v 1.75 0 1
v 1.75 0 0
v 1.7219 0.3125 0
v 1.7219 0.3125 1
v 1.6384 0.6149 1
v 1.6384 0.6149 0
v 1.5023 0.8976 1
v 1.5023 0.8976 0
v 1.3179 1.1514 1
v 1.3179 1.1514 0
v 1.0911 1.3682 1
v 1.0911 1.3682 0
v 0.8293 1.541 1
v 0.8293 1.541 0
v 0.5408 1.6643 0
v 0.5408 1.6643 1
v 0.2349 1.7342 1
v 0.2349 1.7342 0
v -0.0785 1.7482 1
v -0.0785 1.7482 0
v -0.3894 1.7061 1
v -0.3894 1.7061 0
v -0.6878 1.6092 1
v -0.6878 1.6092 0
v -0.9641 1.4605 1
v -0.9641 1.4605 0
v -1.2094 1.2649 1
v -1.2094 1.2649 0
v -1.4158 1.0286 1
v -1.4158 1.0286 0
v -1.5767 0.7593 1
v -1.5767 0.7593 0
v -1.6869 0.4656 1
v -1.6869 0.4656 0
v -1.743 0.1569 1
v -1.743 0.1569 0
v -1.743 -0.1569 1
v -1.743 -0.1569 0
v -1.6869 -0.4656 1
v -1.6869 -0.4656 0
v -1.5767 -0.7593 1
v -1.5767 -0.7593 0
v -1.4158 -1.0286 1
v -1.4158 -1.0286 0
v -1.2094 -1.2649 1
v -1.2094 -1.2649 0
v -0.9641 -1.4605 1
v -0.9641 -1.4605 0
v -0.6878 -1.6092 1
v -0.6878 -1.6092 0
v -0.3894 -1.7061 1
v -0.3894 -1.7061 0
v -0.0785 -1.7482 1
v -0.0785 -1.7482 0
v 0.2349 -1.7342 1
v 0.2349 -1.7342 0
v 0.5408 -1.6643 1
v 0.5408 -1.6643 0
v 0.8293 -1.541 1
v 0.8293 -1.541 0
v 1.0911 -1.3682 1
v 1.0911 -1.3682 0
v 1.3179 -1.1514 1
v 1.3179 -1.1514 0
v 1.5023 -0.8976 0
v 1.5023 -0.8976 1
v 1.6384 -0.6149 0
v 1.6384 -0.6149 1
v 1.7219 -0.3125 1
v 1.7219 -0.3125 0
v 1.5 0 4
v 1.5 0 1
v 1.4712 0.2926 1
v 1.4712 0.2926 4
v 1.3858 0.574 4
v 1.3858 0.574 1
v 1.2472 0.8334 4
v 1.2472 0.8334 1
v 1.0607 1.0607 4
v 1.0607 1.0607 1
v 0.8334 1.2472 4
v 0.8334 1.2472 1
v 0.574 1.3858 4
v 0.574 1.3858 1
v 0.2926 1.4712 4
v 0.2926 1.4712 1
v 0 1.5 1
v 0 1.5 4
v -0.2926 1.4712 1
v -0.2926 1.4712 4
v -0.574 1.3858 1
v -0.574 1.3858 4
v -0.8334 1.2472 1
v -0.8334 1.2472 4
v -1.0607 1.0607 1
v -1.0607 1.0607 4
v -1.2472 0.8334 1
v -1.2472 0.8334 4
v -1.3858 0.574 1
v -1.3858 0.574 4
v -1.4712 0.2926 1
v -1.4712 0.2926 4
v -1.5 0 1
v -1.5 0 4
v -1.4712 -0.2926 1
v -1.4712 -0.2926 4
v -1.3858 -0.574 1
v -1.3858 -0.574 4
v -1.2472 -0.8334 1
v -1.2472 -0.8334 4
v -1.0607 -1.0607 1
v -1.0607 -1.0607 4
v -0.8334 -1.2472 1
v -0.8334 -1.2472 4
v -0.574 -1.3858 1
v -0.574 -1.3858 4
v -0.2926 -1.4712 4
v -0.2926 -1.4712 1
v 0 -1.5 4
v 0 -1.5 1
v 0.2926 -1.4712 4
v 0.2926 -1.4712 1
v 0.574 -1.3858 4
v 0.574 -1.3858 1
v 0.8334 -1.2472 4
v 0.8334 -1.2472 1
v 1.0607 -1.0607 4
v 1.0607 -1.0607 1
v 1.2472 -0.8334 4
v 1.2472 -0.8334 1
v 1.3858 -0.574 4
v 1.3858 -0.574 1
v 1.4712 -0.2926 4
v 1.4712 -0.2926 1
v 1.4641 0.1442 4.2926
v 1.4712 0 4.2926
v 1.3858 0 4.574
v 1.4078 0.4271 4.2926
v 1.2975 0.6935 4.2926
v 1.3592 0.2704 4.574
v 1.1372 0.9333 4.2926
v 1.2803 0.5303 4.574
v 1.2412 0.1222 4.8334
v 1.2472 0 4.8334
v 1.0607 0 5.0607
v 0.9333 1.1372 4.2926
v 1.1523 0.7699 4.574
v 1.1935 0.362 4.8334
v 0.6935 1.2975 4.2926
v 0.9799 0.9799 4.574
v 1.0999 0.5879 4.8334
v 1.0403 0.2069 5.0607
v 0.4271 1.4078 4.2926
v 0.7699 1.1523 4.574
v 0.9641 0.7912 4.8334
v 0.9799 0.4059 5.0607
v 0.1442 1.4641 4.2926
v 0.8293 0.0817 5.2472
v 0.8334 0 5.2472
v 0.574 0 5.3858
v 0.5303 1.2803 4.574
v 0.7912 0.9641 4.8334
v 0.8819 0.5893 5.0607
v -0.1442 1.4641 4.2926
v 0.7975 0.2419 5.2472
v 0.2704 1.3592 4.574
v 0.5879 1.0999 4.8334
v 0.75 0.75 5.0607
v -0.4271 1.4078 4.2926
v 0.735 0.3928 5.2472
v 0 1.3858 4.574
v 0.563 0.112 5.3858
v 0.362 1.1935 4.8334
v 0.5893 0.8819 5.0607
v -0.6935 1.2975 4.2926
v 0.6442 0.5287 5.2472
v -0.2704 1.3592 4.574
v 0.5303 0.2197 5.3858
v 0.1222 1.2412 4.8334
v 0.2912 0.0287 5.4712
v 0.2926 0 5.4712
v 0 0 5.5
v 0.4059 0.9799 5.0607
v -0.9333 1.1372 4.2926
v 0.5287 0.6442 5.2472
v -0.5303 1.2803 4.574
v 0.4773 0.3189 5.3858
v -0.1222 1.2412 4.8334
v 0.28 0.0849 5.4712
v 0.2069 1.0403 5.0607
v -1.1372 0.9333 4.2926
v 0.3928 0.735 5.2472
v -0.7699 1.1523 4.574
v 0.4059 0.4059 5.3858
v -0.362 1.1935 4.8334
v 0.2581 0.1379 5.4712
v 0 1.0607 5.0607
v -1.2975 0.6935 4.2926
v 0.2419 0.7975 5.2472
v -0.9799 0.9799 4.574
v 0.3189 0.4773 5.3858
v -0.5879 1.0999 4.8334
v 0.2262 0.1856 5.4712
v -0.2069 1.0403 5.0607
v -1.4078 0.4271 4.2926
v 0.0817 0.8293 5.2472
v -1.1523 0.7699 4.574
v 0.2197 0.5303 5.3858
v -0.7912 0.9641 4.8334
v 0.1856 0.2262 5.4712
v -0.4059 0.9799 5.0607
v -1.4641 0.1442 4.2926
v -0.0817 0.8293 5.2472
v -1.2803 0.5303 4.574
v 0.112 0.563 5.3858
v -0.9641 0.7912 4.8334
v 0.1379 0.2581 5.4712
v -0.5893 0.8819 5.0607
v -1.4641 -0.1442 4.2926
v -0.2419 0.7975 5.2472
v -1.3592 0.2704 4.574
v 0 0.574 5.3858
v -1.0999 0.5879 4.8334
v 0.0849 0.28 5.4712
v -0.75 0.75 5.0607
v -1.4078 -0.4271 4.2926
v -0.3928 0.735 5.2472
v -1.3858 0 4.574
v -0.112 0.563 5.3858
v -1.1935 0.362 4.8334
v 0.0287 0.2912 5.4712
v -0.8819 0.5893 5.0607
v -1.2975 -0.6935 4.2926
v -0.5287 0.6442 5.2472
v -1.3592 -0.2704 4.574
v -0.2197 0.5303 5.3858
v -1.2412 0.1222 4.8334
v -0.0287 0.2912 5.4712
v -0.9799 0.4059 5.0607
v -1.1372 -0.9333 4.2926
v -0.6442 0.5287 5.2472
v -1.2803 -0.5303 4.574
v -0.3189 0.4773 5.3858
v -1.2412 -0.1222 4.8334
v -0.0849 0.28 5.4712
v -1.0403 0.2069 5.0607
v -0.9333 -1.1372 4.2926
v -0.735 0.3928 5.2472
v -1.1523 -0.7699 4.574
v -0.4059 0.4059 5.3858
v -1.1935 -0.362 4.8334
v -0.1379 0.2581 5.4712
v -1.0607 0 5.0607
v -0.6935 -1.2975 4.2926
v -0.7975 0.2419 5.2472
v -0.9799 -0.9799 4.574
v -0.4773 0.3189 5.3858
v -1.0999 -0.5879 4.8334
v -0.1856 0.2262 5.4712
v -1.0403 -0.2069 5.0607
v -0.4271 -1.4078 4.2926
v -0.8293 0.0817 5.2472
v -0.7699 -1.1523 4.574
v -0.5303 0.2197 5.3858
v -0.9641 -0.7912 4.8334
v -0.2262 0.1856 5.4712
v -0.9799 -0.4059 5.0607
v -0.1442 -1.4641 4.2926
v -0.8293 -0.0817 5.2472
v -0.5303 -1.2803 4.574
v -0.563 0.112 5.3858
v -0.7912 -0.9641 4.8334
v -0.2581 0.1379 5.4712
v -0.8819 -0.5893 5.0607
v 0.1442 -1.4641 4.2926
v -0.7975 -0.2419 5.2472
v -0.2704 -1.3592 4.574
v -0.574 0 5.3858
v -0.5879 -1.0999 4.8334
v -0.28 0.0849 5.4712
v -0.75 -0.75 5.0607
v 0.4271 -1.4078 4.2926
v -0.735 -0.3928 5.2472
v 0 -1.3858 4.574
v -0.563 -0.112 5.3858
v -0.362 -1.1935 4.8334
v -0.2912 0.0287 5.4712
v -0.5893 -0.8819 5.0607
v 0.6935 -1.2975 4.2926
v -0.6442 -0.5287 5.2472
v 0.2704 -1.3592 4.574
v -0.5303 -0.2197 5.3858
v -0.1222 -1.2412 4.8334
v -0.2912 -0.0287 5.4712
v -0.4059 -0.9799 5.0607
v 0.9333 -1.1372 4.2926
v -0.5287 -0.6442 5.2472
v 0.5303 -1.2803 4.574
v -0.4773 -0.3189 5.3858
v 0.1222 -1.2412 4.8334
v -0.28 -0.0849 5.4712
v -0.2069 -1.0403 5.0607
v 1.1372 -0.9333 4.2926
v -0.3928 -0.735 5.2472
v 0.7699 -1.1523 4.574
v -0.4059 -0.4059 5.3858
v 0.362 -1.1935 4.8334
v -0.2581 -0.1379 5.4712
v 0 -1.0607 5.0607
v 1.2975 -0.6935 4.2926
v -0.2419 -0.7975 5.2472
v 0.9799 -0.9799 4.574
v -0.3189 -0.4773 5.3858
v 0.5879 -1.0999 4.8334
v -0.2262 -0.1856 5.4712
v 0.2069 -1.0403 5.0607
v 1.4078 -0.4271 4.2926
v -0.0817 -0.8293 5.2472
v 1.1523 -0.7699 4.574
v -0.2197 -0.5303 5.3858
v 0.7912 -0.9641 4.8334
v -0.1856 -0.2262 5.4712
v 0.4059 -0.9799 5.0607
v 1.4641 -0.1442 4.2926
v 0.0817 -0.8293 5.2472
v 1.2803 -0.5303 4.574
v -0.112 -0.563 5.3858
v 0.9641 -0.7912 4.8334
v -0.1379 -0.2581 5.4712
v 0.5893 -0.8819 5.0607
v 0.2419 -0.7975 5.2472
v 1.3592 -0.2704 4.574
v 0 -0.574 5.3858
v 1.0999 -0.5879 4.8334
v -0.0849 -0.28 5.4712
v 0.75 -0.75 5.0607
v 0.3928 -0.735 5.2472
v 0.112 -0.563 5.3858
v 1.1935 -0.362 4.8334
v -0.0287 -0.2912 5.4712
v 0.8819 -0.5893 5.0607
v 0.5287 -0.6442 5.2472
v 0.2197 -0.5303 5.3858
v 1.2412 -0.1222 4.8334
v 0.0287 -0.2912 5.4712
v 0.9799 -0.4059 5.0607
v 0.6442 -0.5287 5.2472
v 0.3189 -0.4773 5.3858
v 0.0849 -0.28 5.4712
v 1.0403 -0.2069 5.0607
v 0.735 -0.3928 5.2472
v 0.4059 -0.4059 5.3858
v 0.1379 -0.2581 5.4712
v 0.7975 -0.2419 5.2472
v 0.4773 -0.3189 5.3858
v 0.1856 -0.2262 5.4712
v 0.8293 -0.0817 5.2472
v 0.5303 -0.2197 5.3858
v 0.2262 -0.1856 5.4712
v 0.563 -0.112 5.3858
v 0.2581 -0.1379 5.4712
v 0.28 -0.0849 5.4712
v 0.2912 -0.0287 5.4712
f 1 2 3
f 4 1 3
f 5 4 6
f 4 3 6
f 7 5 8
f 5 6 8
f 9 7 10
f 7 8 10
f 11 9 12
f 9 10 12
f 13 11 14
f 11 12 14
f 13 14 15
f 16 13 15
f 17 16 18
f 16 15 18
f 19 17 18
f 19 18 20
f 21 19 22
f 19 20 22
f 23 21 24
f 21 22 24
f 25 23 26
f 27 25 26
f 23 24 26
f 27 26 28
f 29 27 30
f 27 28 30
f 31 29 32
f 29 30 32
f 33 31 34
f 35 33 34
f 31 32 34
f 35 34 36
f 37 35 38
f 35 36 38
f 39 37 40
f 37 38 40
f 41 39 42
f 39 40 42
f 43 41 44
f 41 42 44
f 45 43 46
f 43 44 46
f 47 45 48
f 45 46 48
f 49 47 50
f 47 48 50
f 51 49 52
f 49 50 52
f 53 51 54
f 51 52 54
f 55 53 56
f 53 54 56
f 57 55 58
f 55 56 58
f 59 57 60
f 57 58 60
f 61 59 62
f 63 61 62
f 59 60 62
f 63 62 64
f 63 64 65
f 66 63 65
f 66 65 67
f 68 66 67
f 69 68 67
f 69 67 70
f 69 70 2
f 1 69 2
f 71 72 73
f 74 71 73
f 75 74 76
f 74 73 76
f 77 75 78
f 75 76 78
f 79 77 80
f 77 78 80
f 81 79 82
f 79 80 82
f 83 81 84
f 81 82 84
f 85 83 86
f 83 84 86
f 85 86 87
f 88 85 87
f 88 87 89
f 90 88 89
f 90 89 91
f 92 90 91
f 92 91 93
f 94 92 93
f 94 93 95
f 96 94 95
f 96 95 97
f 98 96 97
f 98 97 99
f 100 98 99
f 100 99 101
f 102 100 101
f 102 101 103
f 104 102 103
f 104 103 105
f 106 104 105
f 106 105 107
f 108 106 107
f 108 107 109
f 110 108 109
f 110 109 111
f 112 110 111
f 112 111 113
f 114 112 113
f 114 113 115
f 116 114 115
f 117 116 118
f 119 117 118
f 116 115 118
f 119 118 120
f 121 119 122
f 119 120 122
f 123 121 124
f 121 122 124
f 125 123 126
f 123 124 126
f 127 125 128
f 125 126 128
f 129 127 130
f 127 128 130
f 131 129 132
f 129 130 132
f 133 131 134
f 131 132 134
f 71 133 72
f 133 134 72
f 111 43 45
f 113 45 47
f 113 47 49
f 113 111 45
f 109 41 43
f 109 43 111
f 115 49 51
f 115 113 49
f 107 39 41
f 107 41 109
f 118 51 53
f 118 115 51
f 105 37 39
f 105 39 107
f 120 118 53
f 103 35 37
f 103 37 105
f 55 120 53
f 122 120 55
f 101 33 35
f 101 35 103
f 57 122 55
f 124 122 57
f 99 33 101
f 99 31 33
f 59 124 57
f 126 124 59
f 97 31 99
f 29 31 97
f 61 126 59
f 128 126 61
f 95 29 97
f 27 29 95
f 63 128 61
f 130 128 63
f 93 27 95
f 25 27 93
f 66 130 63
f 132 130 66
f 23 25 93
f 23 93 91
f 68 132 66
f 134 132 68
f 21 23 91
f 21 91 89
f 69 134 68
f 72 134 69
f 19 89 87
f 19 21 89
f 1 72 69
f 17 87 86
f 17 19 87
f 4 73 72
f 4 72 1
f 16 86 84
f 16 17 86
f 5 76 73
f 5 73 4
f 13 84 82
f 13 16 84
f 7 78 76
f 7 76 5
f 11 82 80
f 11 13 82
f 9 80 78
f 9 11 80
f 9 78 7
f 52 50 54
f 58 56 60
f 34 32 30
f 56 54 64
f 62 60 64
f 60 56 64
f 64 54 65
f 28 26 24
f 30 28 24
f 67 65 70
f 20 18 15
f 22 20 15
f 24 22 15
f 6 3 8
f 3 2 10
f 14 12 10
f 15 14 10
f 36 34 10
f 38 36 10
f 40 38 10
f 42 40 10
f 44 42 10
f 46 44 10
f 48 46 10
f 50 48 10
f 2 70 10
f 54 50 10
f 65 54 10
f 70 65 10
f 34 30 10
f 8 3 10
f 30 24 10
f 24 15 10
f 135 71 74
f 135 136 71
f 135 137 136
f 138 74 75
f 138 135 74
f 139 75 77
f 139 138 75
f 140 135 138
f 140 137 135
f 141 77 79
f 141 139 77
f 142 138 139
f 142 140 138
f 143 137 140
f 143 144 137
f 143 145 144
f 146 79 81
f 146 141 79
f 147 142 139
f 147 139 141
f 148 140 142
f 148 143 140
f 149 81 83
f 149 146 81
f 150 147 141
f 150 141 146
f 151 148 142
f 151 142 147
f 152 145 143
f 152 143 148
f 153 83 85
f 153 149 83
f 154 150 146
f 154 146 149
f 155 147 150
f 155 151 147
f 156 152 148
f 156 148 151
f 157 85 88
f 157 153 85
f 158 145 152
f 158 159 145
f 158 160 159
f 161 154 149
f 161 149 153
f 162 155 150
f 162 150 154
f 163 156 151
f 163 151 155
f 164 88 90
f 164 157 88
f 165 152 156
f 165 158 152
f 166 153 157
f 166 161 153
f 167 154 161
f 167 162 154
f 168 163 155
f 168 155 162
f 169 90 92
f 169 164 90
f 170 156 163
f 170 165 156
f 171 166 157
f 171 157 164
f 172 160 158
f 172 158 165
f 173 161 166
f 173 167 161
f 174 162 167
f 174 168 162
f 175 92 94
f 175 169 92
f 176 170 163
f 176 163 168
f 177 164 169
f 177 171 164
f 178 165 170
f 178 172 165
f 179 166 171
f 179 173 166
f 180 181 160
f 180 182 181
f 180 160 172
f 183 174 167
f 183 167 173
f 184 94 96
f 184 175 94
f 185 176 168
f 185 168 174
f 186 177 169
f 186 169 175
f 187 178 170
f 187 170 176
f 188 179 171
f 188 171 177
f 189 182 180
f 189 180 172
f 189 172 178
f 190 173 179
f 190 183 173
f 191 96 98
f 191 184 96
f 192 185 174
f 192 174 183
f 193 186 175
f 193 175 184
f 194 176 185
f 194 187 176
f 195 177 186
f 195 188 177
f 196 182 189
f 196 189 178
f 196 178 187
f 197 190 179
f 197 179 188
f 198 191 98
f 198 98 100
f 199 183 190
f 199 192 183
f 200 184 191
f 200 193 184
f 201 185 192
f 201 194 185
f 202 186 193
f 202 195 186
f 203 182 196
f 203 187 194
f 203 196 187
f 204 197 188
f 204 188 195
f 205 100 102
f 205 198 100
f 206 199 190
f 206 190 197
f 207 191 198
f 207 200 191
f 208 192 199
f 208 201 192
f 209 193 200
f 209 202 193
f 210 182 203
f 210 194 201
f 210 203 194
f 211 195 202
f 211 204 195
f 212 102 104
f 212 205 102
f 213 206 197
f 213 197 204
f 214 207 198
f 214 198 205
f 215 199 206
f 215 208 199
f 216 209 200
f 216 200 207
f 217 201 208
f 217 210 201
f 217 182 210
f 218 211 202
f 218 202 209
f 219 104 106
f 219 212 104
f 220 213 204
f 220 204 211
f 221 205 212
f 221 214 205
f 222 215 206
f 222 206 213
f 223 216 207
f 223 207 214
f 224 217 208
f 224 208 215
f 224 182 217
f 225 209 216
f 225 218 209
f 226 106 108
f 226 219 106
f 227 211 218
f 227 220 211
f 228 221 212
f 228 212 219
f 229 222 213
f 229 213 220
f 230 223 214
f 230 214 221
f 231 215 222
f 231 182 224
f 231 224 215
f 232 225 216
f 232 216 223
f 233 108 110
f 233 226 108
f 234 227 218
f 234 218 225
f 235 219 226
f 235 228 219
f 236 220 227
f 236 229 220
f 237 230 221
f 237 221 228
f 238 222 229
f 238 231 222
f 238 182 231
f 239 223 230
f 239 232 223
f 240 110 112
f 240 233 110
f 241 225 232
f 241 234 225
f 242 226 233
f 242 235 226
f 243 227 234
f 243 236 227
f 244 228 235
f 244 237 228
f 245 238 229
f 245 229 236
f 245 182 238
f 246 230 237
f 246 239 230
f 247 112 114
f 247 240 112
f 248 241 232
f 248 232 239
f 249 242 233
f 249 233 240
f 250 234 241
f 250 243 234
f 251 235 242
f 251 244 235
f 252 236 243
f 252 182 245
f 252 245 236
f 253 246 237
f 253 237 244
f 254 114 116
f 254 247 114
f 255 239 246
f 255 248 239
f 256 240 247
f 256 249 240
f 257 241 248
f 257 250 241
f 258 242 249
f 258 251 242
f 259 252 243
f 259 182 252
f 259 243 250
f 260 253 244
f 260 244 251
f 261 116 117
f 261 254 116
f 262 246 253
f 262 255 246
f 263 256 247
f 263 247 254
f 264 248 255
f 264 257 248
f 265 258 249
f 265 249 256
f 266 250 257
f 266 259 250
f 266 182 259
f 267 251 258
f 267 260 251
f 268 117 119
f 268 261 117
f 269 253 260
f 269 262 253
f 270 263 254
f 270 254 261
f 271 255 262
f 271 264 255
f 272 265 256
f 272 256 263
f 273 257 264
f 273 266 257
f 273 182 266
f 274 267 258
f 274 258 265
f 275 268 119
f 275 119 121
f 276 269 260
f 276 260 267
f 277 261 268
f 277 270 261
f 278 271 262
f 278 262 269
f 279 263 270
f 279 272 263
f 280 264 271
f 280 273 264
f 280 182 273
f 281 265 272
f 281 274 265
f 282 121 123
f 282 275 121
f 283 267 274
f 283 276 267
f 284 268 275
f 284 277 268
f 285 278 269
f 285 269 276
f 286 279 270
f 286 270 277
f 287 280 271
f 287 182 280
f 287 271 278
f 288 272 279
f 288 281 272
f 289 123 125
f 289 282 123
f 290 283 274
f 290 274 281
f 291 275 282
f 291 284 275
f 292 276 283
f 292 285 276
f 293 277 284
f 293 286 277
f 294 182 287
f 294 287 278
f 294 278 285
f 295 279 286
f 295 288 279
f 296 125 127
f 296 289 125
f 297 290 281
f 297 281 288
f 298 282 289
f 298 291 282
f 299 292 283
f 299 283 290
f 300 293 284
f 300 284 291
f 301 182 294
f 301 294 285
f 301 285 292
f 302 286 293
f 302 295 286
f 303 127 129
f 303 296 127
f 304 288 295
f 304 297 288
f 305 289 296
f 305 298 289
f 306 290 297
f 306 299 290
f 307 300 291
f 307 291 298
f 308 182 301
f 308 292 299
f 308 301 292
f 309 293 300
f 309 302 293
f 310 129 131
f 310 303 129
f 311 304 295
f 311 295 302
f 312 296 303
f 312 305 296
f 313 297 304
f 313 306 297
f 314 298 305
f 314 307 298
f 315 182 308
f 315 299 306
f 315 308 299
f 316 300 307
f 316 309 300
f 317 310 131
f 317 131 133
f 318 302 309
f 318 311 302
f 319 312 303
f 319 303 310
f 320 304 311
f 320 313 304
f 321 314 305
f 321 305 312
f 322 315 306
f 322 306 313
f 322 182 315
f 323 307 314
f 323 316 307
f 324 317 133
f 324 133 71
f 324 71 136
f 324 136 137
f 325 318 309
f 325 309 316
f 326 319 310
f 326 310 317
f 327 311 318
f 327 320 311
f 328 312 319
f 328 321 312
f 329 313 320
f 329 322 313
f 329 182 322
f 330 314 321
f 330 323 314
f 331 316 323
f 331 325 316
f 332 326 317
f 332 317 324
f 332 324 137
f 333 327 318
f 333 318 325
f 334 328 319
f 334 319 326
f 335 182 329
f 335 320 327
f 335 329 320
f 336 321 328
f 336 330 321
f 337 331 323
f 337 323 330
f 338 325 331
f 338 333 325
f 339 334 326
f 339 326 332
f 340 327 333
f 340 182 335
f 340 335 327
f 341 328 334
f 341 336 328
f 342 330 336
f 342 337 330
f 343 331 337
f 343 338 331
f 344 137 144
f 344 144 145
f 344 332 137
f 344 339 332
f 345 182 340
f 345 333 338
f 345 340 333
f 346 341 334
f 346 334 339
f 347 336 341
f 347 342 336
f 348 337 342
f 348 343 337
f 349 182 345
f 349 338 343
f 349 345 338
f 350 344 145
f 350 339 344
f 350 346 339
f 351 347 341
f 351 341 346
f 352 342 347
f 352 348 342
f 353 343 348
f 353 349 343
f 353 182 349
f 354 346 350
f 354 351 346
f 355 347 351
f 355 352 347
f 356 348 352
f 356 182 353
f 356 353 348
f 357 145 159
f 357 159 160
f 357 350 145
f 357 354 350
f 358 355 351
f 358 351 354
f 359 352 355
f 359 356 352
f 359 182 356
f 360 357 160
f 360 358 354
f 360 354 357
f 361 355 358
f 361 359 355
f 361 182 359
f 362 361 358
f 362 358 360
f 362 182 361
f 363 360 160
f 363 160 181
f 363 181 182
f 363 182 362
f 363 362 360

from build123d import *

# Parameters (mm, degrees)
CYLINDER001_R     = 1.75
CYLINDER001_DEPTH = 1
CYLINDER_R        = 1.5
CYLINDER_DEPTH    = 4


with BuildPart() as led_base:
    # Cylinder001 → Cylinder001 (new body)
    with BuildSketch(Plane.XY):
        Circle(CYLINDER001_R)
    extrude(amount=CYLINDER001_DEPTH)


with BuildPart() as led_body:
    # Cylinder → Cylinder (new body)
    with BuildSketch(Plane.XY):
        Circle(CYLINDER_R)
    extrude(amount=CYLINDER_DEPTH)


with BuildPart() as led:
    # Sphere → Sphere (revolve)
    with BuildSketch(Plane(origin=(0, 0, 4), x_dir=(1, 0, 0), z_dir=(0, -1, 0))):
        with BuildLine():
            ThreePointArc((0, -1.5), (1.5, 0), (0, 1.5))
            Line((0, 1.5), (0, -1.5))
        make_face()
    revolve(axis=Axis((0, 0, 4), (0, 0, 1)))

    # Fusion: union LED_Base, LED_Body
    add(led_base.part)
    add(led_body.part)


solid = led.part
